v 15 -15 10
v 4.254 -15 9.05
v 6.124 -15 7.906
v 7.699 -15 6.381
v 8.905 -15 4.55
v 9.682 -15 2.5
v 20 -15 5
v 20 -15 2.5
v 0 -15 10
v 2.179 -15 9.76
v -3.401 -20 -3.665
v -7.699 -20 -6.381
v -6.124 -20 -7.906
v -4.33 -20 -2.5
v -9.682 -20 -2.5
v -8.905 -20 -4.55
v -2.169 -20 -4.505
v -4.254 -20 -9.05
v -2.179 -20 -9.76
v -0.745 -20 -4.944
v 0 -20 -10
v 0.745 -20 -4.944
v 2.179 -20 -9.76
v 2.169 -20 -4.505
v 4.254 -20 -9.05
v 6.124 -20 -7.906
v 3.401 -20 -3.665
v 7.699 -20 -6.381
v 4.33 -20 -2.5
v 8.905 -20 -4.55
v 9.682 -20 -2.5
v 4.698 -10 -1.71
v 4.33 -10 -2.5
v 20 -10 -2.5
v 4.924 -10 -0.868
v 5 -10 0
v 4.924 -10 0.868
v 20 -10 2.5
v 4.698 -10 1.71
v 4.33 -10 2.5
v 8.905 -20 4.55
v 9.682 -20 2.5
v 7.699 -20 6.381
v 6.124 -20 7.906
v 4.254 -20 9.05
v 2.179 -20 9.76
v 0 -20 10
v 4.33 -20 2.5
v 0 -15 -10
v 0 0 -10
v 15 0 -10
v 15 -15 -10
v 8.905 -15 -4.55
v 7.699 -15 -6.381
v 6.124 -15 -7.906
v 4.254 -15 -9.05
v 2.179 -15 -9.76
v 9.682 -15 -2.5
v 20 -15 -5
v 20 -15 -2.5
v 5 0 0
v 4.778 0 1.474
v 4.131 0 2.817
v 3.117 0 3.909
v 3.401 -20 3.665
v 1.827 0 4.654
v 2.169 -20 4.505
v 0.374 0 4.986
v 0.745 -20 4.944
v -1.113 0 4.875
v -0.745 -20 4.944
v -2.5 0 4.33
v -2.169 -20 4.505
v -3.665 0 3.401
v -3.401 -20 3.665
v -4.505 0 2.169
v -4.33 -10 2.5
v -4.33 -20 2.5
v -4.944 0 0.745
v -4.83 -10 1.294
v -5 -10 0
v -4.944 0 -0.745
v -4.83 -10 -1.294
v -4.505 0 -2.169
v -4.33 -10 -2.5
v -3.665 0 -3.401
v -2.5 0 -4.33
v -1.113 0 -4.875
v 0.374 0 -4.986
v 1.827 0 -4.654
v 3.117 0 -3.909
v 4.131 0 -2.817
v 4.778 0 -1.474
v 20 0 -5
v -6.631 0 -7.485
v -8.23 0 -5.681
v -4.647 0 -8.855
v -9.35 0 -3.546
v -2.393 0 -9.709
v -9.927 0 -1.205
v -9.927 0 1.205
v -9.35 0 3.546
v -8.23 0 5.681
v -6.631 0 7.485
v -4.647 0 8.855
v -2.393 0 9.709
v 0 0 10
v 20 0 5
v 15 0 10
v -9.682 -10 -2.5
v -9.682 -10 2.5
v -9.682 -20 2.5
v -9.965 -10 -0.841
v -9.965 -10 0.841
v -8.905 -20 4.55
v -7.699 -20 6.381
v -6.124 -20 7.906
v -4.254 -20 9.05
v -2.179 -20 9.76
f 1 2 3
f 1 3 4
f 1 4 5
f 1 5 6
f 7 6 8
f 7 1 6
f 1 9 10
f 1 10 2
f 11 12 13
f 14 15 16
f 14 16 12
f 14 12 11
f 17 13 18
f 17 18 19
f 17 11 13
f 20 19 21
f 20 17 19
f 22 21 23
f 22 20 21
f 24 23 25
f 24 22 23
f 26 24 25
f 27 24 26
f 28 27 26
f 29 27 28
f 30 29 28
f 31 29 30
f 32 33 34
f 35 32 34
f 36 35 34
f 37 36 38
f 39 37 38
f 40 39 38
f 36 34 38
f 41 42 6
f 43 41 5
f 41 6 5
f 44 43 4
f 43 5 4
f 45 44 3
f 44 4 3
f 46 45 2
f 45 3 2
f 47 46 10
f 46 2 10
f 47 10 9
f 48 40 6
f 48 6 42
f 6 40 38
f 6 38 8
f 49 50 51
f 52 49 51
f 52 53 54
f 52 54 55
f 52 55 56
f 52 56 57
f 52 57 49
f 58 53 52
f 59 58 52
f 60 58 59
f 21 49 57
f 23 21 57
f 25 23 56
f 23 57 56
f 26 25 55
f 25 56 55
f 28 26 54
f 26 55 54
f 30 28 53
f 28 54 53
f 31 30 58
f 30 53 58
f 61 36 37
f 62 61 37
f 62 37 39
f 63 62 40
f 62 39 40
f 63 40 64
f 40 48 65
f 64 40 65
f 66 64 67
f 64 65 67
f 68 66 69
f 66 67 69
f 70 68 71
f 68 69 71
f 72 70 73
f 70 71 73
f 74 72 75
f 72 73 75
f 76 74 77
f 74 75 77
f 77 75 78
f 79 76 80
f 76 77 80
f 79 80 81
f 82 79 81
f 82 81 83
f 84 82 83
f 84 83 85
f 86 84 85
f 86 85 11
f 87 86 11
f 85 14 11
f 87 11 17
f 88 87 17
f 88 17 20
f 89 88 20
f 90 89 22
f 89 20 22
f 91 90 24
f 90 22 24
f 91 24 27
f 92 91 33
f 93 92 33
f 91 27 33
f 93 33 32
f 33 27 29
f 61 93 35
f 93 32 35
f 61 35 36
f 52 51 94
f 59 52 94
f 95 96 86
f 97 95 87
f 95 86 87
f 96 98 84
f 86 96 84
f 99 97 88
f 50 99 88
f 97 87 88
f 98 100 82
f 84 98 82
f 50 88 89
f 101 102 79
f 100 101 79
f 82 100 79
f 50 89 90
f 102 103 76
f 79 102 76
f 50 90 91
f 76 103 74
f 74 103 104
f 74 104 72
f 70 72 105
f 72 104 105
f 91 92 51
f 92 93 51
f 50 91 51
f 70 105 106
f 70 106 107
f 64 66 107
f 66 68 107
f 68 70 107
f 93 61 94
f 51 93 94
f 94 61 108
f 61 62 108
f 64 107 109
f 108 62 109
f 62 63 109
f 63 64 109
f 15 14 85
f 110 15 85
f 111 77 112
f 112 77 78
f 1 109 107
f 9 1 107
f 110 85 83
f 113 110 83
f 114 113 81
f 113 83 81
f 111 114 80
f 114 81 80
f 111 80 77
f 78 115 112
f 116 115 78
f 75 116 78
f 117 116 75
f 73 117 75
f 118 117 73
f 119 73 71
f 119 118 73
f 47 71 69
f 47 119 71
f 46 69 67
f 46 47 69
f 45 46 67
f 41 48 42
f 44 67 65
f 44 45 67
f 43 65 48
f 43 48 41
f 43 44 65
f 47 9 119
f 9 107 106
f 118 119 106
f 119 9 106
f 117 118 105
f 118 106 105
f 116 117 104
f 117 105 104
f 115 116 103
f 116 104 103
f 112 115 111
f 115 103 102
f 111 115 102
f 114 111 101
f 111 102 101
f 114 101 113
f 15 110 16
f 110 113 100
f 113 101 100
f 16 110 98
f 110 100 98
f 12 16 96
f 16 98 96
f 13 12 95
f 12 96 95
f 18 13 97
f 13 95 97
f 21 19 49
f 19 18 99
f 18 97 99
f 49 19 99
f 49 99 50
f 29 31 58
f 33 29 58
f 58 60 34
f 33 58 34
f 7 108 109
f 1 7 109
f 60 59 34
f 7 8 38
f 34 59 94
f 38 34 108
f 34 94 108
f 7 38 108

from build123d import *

# Parameters (mm, degrees)
F1_DEPTH = 20
F2_DEPTH = 15
F3_R     = 5
F4_DEPTH = 20.001
F5_W     = 5
F5_H     = 5
F6_DEPTH = 30.001


with BuildPart() as f1:
    # F0 (on Front) → F1 (new body)
    with BuildSketch(Plane.XZ):
        with BuildLine():
            ThreePointArc((0, -10), (7.071068, -7.071068), (10, 0))
            ThreePointArc((10, 0), (7.071068, 7.071068), (0, 10))
            ThreePointArc((0, 10), (-10, 0), (0, -10))
        make_face()
    extrude(amount=F1_DEPTH)

    # F0 (on Front) → F2 (join)
    with BuildSketch(Plane.XZ):
        with BuildLine():
            ThreePointArc((0, 10), (7.071068, 7.071068), (10, 0))
            ThreePointArc((10, 0), (7.071068, -7.071068), (0, -10))
            Line((0, -10), (15, -10))
            Line((15, -10), (20, -5))
            Line((20, -5), (20, 5))
            Line((20, 5), (15, 10))
            Line((15, 10), (0, 10))
        make_face()
    extrude(amount=F2_DEPTH)

    # F3 (on face) → F4 (cut, through all)
    with BuildSketch(Plane.XZ.offset(20)):
        Circle(F3_R)
    extrude(amount=-F4_DEPTH, mode=Mode.SUBTRACT)

    # F5 (on face) → F6 (cut, through all)
    with BuildSketch(Plane.YZ.offset(20)):
        with Locations((-12.5, 0)):
            Rectangle(F5_W, F5_H)
        with Locations((-17.5, 0)):
            Rectangle(F5_W, F5_H)
    extrude(amount=-F6_DEPTH, mode=Mode.SUBTRACT)


solid = f1.part
